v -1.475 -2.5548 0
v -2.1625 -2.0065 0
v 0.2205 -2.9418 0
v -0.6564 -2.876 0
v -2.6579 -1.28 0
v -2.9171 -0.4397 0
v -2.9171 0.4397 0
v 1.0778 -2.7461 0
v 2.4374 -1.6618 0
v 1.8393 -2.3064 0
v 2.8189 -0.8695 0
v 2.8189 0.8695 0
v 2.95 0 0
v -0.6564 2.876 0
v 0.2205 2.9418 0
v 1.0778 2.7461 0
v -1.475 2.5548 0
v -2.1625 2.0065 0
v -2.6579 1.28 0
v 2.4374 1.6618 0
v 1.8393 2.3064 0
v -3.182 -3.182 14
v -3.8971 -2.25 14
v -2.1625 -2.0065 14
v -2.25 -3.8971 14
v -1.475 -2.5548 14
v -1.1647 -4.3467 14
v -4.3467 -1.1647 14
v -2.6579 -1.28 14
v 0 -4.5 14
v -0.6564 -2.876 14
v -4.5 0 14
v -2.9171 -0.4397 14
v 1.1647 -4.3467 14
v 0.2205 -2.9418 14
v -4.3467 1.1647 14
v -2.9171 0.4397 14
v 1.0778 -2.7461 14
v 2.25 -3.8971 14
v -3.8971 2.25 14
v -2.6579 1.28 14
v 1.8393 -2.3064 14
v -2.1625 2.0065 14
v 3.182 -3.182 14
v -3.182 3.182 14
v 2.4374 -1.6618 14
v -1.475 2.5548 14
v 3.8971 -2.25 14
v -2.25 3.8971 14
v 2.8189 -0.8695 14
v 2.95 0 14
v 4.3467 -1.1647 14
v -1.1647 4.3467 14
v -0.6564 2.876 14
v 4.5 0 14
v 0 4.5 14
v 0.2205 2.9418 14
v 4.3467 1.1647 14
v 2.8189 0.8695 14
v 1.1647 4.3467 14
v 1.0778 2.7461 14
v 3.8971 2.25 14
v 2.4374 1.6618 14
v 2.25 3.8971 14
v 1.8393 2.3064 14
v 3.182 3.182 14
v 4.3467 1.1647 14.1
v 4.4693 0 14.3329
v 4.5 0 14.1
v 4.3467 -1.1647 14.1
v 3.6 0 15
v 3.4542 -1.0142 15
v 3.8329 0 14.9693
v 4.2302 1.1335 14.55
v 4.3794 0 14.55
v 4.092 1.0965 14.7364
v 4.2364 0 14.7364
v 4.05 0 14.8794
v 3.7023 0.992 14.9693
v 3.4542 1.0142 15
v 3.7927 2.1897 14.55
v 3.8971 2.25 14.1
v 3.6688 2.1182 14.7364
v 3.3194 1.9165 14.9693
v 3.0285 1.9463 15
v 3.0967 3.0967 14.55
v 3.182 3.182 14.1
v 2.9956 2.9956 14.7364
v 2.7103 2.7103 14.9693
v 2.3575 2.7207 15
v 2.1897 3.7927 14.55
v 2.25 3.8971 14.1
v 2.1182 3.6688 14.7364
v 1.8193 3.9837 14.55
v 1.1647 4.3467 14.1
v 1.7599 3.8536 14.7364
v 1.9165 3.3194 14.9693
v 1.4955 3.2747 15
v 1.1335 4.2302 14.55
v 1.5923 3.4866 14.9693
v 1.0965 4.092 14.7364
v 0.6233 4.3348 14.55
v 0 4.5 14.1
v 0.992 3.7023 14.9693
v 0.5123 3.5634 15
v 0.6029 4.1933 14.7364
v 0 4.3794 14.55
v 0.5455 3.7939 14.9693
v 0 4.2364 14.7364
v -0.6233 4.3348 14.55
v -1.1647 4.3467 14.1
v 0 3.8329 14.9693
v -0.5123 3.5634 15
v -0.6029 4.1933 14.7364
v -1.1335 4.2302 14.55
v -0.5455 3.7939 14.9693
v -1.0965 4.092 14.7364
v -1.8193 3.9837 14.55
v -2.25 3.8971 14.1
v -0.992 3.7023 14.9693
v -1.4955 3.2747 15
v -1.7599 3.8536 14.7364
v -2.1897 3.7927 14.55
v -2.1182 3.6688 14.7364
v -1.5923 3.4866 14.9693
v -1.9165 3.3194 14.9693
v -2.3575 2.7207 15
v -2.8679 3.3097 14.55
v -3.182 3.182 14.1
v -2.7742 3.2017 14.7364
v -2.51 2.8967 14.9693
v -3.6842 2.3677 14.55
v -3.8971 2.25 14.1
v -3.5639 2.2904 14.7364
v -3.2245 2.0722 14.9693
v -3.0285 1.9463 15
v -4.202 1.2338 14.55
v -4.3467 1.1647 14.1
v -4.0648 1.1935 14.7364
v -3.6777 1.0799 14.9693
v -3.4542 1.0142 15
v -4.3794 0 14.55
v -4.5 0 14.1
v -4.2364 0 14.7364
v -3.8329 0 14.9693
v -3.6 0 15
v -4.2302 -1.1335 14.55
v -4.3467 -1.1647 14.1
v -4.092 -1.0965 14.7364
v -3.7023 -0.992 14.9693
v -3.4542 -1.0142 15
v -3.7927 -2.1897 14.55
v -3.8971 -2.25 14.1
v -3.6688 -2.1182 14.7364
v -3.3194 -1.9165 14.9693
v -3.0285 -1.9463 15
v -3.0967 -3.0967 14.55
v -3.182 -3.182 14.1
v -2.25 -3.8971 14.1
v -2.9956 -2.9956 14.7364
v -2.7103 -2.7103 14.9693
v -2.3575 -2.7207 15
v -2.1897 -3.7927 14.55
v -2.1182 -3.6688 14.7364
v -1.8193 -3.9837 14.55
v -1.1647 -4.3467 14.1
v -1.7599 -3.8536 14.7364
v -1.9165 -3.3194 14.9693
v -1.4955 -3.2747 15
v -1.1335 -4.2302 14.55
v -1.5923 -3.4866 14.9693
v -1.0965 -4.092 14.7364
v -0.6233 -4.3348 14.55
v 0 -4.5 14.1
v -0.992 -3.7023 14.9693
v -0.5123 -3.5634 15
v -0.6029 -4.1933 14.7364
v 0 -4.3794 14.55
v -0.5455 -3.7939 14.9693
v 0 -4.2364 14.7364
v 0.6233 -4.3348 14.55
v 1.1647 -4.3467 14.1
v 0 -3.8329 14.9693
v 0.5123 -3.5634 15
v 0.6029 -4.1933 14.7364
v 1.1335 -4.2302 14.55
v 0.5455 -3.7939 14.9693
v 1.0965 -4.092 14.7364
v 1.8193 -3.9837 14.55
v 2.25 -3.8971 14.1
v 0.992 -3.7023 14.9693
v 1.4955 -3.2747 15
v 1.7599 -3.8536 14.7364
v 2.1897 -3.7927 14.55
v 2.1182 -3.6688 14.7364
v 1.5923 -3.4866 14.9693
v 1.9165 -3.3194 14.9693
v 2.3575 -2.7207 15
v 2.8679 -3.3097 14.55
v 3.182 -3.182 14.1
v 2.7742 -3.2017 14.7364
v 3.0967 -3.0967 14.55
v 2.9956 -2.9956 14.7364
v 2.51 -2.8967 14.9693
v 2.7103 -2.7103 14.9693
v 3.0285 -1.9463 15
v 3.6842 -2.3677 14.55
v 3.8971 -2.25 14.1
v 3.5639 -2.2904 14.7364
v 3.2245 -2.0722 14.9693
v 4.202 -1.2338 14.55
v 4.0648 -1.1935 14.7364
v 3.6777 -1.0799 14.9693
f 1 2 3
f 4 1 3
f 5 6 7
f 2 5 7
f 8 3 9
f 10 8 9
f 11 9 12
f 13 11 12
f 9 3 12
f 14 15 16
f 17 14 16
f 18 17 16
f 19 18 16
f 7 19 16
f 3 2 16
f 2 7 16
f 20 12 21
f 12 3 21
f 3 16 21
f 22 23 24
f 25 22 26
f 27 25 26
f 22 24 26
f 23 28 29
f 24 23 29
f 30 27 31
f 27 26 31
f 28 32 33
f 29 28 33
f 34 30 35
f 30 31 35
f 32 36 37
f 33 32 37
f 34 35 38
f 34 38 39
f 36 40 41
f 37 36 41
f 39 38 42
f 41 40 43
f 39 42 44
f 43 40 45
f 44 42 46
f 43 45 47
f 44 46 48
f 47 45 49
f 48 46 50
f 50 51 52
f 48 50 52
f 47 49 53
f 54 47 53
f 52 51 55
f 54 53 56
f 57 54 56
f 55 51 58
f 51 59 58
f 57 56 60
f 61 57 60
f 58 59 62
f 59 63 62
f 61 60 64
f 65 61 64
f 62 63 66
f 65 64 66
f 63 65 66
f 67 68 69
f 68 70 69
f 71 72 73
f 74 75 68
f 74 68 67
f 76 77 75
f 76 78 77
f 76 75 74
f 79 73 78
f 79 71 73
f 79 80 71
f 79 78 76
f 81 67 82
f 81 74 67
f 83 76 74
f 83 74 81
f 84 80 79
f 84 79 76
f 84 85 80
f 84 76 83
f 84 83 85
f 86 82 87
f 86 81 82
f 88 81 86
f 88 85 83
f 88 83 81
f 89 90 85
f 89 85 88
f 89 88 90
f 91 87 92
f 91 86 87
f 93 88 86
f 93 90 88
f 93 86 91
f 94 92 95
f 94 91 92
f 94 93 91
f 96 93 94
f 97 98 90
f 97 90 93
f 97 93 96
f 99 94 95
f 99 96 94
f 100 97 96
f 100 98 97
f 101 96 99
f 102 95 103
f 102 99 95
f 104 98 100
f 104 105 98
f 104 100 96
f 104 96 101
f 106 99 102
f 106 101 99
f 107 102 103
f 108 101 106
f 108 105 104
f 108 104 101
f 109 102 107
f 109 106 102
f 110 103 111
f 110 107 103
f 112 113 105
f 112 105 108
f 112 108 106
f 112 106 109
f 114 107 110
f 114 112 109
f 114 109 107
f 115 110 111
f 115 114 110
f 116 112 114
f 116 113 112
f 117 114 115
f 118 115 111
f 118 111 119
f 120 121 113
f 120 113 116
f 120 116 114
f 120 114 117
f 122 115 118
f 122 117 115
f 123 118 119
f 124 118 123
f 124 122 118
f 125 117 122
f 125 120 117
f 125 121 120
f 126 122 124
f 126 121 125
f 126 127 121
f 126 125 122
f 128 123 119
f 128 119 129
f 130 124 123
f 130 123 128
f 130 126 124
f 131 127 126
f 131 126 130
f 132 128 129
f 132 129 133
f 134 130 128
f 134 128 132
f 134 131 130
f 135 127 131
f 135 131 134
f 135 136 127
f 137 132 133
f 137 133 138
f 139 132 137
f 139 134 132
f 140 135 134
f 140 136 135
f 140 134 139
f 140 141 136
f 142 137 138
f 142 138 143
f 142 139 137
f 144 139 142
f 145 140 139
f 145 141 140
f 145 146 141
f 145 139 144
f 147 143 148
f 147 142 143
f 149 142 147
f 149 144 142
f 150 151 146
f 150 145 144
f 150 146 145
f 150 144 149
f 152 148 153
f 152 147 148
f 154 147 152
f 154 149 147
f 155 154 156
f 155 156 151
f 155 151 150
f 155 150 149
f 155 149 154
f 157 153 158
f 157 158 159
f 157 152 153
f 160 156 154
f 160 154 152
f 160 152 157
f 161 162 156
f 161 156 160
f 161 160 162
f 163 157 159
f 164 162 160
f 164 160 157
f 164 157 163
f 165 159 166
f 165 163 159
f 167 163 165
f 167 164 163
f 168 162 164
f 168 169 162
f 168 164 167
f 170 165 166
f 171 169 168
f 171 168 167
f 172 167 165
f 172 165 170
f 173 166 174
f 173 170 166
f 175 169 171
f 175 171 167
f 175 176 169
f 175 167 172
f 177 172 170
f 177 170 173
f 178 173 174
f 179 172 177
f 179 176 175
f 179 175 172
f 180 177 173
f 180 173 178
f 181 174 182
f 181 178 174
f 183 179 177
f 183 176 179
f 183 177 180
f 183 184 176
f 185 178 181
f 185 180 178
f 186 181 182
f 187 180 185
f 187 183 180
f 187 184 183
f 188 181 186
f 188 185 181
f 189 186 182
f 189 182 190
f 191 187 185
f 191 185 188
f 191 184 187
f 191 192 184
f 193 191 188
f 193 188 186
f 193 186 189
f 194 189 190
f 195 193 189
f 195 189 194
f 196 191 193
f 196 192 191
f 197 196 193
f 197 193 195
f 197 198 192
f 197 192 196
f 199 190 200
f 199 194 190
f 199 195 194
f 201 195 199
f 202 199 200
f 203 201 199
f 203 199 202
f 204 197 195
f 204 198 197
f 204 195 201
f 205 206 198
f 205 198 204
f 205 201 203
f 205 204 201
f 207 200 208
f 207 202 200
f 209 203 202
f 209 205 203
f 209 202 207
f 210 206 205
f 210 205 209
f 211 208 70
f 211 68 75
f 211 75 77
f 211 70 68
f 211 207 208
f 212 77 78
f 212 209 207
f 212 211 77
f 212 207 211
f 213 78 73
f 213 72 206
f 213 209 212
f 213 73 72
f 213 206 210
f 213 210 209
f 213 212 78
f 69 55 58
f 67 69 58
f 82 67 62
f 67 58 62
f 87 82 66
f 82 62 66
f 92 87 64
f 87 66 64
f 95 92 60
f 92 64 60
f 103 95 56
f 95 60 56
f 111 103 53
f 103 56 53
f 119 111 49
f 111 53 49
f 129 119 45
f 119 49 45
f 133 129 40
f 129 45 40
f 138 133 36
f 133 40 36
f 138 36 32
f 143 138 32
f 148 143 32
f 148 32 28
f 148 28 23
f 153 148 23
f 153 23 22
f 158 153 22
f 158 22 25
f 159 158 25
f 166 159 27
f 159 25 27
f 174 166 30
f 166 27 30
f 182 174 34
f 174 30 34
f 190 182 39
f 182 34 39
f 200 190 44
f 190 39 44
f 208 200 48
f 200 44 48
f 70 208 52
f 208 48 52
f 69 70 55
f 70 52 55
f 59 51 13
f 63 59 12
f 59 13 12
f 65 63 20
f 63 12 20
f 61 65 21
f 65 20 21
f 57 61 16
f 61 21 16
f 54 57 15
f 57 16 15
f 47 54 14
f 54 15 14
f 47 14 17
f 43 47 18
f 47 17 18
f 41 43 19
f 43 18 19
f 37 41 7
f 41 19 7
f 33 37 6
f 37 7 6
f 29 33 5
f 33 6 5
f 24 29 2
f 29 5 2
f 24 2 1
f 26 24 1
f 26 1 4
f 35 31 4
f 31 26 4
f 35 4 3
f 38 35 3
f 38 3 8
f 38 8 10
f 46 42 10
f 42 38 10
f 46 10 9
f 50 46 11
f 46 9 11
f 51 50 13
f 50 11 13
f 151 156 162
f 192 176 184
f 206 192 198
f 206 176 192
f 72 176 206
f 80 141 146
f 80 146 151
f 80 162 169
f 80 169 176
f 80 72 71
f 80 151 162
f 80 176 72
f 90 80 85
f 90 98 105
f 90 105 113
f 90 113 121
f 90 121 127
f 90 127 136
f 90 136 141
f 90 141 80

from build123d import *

# Parameters (mm, degrees)
CYLINDER001_R     = 4.5
CYLINDER001_DEPTH = 1
FILLET_R          = 0.9
CYLINDER_R        = 2.95
CYLINDER_DEPTH    = 15


with BuildPart() as fillet_body:
    # Cylinder001 → Cylinder001 (new body)
    with BuildSketch(Plane.XY.offset(14)):
        Circle(CYLINDER001_R)
    extrude(amount=CYLINDER001_DEPTH)

    # Fillet
    fillet_edges = [fillet_body.edges().sort_by_distance(p)[0] for p in [
        (-4.5, 0, 15),
    ]]
    fillet(fillet_edges, radius=FILLET_R)


with BuildPart() as fusion:
    # Cylinder → Cylinder (new body)
    with BuildSketch(Plane.XY):
        Circle(CYLINDER_R)
    extrude(amount=CYLINDER_DEPTH)

    # Fusion: union Fillet body
    add(fillet_body.part)


solid = fusion.part
